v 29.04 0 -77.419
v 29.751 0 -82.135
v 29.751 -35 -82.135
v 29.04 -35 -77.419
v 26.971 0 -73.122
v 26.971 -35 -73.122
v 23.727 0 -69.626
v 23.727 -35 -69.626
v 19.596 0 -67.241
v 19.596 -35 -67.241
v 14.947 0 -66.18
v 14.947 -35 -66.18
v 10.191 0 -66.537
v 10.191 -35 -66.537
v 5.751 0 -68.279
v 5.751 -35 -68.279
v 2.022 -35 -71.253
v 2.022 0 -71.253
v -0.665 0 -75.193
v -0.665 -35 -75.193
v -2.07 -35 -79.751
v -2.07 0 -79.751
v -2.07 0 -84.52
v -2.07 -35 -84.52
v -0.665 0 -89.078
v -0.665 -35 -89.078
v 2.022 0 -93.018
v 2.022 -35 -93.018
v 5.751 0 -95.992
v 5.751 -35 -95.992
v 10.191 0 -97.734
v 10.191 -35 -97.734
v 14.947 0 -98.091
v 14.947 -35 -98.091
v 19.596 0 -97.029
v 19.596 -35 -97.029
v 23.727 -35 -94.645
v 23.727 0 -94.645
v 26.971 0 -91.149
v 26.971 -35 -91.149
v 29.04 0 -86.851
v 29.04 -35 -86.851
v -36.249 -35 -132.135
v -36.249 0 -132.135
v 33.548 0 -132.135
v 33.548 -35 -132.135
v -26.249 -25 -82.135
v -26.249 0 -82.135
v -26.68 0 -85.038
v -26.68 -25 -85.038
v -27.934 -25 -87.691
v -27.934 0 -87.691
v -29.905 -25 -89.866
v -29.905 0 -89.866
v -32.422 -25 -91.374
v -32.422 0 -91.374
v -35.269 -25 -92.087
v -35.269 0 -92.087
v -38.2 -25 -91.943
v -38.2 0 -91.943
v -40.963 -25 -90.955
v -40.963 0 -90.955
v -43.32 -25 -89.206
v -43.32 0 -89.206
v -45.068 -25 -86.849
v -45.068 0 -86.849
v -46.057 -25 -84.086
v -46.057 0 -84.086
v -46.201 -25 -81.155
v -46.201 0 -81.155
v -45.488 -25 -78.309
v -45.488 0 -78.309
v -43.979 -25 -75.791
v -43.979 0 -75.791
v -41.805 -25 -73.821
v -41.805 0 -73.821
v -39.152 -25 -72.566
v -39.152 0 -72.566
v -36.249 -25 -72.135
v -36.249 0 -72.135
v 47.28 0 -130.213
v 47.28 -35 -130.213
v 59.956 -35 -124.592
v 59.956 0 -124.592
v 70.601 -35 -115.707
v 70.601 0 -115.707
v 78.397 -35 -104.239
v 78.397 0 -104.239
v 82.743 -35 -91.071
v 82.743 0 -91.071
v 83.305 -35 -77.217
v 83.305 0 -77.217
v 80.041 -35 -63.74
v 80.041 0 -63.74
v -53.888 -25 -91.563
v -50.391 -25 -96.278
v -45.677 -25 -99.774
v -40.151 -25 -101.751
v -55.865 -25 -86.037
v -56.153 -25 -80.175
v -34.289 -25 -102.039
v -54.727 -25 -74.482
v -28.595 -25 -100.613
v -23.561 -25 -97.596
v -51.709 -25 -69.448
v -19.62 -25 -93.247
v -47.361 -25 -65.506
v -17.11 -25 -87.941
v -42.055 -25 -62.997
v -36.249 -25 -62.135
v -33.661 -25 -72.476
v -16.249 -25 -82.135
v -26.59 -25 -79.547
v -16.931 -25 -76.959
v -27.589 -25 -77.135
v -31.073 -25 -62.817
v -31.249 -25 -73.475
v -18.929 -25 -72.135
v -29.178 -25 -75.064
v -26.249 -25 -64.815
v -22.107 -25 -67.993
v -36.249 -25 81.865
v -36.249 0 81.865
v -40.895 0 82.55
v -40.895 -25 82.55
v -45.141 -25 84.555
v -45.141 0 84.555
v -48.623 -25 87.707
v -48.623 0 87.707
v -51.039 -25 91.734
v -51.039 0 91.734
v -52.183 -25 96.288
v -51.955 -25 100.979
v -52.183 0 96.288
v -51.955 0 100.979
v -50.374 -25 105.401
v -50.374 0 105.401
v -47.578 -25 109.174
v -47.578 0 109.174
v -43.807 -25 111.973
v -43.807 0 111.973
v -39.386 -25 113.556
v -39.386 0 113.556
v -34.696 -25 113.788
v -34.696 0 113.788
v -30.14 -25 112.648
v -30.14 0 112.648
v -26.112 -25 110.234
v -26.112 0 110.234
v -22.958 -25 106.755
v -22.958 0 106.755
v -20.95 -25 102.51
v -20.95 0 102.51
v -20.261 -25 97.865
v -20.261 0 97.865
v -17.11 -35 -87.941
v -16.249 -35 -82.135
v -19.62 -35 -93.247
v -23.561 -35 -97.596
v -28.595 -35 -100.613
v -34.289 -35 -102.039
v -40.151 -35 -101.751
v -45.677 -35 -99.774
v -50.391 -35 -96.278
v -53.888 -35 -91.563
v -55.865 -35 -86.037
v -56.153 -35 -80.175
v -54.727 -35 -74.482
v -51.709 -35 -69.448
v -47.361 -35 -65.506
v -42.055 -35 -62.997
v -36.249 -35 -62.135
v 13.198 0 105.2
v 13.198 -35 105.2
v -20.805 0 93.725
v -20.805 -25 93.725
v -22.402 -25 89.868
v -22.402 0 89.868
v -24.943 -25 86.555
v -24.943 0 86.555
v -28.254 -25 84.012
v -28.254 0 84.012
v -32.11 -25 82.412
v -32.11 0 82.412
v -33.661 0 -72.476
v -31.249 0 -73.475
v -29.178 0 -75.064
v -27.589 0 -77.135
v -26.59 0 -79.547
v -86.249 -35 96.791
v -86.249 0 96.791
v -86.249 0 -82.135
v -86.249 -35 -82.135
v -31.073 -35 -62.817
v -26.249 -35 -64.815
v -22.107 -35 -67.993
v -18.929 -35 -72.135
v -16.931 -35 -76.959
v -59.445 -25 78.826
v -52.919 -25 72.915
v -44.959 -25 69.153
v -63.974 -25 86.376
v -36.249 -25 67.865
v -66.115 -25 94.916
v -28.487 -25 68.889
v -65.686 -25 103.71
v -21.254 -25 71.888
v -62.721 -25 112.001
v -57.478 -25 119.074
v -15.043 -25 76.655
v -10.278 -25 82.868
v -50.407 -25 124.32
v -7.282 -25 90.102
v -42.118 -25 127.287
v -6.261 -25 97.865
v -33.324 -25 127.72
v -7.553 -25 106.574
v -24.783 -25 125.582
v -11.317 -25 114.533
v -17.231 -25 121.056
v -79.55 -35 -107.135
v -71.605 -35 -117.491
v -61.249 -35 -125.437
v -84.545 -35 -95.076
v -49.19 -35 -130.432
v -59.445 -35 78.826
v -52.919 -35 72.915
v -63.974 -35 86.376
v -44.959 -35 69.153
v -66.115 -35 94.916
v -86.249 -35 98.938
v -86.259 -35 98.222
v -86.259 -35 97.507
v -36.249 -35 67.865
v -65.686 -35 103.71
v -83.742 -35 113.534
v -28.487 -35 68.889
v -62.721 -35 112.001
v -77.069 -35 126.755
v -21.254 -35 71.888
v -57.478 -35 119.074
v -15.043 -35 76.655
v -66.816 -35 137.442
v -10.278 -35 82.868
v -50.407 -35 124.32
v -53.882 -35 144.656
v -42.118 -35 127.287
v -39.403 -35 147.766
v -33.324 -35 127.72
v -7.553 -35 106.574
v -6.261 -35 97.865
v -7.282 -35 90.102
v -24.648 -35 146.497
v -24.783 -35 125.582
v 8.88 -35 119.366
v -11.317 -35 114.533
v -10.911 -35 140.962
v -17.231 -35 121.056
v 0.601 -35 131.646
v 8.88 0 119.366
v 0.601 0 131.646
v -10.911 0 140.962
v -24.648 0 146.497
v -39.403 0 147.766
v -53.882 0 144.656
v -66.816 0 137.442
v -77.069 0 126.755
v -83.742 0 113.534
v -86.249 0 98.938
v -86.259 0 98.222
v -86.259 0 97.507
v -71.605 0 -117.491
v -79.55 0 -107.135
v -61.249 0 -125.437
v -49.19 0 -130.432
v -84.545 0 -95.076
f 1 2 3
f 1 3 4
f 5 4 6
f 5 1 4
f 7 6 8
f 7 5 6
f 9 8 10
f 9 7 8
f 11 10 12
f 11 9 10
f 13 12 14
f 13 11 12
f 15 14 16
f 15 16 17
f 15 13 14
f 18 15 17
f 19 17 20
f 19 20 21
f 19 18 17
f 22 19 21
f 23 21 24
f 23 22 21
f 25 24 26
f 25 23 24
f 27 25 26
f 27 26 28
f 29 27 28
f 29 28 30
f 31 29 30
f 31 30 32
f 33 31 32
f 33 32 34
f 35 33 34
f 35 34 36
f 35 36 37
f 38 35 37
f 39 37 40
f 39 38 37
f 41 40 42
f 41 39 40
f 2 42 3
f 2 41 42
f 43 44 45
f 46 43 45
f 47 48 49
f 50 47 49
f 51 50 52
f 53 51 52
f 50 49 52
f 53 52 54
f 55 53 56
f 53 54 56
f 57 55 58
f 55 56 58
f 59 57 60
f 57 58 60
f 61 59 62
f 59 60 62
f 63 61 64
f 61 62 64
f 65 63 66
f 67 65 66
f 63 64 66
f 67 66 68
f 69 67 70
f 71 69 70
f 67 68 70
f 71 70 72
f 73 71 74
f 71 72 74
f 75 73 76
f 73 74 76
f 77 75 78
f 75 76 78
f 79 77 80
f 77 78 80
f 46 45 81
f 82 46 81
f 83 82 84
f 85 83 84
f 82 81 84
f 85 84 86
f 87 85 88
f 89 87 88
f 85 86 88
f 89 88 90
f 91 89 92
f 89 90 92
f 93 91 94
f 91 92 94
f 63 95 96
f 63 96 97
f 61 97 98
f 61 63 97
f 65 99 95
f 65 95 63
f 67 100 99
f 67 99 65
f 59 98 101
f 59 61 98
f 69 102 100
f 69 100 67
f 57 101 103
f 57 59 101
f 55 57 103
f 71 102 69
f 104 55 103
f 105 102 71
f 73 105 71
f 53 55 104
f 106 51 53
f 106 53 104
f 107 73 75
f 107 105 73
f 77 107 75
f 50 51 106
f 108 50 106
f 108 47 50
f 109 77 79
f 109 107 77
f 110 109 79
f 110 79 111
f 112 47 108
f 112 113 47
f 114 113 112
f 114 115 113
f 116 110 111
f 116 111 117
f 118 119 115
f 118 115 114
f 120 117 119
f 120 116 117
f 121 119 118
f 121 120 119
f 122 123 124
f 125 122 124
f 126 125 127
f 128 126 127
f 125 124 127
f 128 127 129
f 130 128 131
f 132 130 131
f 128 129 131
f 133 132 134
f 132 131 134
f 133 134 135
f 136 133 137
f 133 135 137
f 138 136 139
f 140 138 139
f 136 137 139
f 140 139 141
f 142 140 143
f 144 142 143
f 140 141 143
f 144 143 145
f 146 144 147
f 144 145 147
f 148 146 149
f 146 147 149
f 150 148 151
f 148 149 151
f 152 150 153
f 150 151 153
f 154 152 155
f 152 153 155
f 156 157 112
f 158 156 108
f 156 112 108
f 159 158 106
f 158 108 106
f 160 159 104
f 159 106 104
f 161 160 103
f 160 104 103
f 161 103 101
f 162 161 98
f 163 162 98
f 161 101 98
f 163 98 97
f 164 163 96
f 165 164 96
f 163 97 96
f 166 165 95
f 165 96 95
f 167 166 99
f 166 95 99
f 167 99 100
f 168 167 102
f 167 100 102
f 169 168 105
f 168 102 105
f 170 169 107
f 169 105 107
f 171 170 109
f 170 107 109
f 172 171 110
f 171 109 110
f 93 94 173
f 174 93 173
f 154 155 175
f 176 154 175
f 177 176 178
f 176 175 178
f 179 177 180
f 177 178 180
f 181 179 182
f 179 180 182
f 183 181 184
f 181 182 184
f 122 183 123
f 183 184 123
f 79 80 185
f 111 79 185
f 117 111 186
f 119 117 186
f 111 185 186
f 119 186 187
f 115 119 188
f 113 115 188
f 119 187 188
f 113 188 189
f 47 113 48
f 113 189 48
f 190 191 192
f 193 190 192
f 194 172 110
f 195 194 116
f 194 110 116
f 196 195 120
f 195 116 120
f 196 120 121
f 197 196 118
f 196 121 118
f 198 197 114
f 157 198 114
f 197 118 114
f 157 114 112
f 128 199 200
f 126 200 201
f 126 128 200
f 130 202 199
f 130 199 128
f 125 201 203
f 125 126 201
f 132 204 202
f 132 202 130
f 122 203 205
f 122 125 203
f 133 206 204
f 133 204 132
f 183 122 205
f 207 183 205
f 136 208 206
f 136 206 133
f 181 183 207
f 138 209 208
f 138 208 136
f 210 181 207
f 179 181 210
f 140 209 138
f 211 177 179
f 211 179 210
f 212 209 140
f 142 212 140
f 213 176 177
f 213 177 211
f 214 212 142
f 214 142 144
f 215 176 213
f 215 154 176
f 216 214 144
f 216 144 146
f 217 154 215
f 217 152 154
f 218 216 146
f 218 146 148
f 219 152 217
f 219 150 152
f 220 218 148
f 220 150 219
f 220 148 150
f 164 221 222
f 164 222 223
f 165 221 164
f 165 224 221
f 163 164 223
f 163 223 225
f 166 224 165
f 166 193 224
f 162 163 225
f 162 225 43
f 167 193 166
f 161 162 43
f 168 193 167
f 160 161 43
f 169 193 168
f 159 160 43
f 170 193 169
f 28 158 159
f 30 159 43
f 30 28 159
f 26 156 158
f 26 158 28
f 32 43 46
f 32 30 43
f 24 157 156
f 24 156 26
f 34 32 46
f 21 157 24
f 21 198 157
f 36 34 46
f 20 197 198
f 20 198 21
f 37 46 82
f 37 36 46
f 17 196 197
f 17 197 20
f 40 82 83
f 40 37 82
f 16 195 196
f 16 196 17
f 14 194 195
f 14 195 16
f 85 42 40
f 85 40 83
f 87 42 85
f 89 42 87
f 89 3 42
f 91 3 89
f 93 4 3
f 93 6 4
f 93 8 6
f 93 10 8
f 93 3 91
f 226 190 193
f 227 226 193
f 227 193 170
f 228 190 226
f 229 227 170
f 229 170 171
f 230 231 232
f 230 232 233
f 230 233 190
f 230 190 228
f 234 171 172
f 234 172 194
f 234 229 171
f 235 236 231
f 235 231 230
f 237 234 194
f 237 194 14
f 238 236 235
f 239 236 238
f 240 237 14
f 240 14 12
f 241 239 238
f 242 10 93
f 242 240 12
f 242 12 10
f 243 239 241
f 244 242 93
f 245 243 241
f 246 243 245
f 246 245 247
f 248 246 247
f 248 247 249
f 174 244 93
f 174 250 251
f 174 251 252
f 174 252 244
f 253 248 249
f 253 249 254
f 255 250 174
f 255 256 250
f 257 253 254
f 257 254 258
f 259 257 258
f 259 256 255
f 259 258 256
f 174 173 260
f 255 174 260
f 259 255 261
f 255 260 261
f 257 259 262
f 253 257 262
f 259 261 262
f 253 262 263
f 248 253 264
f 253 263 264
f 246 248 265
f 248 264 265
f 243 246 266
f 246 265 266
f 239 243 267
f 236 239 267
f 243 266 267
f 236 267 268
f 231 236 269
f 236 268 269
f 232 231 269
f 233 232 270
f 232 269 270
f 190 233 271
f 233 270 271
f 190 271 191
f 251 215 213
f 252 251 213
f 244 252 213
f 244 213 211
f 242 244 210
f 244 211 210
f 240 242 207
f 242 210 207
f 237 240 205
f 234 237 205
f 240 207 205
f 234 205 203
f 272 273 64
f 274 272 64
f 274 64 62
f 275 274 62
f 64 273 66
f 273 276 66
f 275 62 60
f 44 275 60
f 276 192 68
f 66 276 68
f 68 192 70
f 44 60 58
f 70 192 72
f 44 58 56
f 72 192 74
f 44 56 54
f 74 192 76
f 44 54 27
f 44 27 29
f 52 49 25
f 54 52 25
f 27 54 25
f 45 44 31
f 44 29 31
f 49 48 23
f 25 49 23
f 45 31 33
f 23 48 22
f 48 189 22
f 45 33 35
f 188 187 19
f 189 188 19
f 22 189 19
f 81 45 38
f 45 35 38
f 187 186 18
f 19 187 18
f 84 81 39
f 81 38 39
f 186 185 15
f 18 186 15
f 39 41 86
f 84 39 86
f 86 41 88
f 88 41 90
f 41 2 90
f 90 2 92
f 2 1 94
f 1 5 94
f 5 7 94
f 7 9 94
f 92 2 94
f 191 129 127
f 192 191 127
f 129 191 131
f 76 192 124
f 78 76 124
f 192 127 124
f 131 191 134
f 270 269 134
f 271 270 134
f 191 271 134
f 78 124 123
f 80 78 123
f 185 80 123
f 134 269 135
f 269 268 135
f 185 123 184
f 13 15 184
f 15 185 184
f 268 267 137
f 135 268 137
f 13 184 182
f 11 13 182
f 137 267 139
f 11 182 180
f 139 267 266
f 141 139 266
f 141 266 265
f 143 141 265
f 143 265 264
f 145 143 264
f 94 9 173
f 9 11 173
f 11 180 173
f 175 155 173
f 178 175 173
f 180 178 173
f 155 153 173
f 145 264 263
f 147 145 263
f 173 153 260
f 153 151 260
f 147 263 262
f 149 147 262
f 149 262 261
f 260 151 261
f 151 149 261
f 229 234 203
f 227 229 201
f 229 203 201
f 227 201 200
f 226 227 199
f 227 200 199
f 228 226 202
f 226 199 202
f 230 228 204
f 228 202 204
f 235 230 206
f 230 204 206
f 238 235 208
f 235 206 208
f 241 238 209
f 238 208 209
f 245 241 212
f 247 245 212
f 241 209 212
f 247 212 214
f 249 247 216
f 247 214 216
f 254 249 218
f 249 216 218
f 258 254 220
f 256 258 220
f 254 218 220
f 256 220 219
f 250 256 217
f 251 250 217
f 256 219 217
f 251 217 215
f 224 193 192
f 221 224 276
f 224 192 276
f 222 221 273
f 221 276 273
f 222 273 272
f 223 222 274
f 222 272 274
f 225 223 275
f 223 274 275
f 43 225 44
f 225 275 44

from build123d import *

# Parameters (mm, degrees)
F1_DEPTH = 25
F0_R     = 16
F2_DEPTH = 35


with BuildPart() as f1:
    # F0 (on Front) → F1 (new body)
    with BuildSketch(Plane.XZ):
        with BuildLine():
            ThreePointArc((-6.260685, 97.864598), (-57.477963, 119.073727), (-36.249162, 67.864601))
            ThreePointArc((-36.249162, 67.864601), (-15.043408, 76.65547), (-6.260685, 97.864598))
        make_face()
        with BuildLine():
            ThreePointArc((-20.260685, 97.864598), (-24.942904, 86.554965), (-36.249162, 81.864603))
            ThreePointArc((-36.249162, 81.864603), (-47.578467, 109.174232), (-20.260685, 97.864598))
        make_face(mode=Mode.SUBTRACT)
        with BuildLine():
            ThreePointArc((-36.249162, -62.135402), (-50.391298, -96.277537), (-16.249162, -82.135402))
            ThreePointArc((-16.249162, -82.135402), (-22.107026, -67.993266), (-36.249162, -62.135402))
        make_face()
        with BuildLine():
            ThreePointArc((-26.249162, -82.135402), (-43.32023, -89.206469), (-36.249162, -72.135402))
            ThreePointArc((-36.249162, -72.135402), (-29.178094, -75.064334), (-26.249162, -82.135402))
        make_face(mode=Mode.SUBTRACT)
    extrude(amount=F1_DEPTH)

    # F0 (on Front) → F2 (join)
    with BuildSketch(Plane.XZ):
        with BuildLine():
            ThreePointArc((-26.249162, -82.135402), (-29.178094, -75.064334), (-36.249162, -72.135402))
            ThreePointArc((-36.249162, -72.135402), (-43.32023, -89.206469), (-26.249162, -82.135402))
        make_face()
        with BuildLine():
            ThreePointArc((-36.249162, -62.135402), (-50.391298, -96.277537), (-16.249162, -82.135402))
            ThreePointArc((-16.249162, -82.135402), (-22.107026, -67.993266), (-36.249162, -62.135402))
        make_face()
        with BuildLine():
            ThreePointArc((-26.249162, -82.135402), (-43.32023, -89.206469), (-36.249162, -72.135402))
            ThreePointArc((-36.249162, -72.135402), (-29.178094, -75.064334), (-26.249162, -82.135402))
        make_face(mode=Mode.SUBTRACT)
        with BuildLine():
            ThreePointArc((-20.260685, 97.864598), (-47.578467, 109.174232), (-36.249162, 81.864603))
            ThreePointArc((-36.249162, 81.864603), (-24.942904, 86.554965), (-20.260685, 97.864598))
        make_face()
        with BuildLine():
            ThreePointArc((-6.260685, 97.864598), (-57.477963, 119.073727), (-36.249162, 67.864601))
            ThreePointArc((-36.249162, 67.864601), (-15.043408, 76.65547), (-6.260685, 97.864598))
        make_face()
        with BuildLine():
            ThreePointArc((-20.260685, 97.864598), (-24.942904, 86.554965), (-36.249162, 81.864603))
            ThreePointArc((-36.249162, 81.864603), (-47.578467, 109.174232), (-20.260685, 97.864598))
        make_face(mode=Mode.SUBTRACT)
        with BuildLine():
            Line((80.040823, -63.740012), (13.198313, 105.199956))
            ThreePointArc((13.198313, 105.199956), (-39.402834, 147.76577), (-86.249162, 98.938004))
            Line((-86.249162, 98.938004), (-86.249162, 96.791193))
            Line((-86.249162, 96.791193), (-86.249162, -82.135402))
            ThreePointArc((-86.249162, -82.135402), (-71.604501, -117.490741), (-36.249162, -132.135402))
            Line((-36.249162, -132.135402), (33.547709, -132.135402))
            ThreePointArc((33.547709, -132.135402), (74.898462, -110.244391), (80.040823, -63.740012))
        make_face()
        with BuildLine():
            ThreePointArc((-36.249162, -62.135402), (-22.107026, -67.993266), (-16.249162, -82.135402))
            ThreePointArc((-16.249162, -82.135402), (-50.391298, -96.277537), (-36.249162, -62.135402))
        make_face(mode=Mode.SUBTRACT)
        with Locations((13.750838, -82.135402)):
            Circle(F0_R, mode=Mode.SUBTRACT)
        with BuildLine():
            ThreePointArc((-6.260685, 97.864598), (-15.043408, 76.65547), (-36.249162, 67.864601))
            ThreePointArc((-36.249162, 67.864601), (-57.477963, 119.073727), (-6.260685, 97.864598))
        make_face(mode=Mode.SUBTRACT)
        with BuildLine():
            Line((-86.249162, 96.791193), (-86.249162, 98.938004))
            ThreePointArc((-86.249162, 98.938004), (-86.260685, 97.864598), (-86.249162, 96.791193))
        make_face()
    extrude(amount=F2_DEPTH)


solid = f1.part
